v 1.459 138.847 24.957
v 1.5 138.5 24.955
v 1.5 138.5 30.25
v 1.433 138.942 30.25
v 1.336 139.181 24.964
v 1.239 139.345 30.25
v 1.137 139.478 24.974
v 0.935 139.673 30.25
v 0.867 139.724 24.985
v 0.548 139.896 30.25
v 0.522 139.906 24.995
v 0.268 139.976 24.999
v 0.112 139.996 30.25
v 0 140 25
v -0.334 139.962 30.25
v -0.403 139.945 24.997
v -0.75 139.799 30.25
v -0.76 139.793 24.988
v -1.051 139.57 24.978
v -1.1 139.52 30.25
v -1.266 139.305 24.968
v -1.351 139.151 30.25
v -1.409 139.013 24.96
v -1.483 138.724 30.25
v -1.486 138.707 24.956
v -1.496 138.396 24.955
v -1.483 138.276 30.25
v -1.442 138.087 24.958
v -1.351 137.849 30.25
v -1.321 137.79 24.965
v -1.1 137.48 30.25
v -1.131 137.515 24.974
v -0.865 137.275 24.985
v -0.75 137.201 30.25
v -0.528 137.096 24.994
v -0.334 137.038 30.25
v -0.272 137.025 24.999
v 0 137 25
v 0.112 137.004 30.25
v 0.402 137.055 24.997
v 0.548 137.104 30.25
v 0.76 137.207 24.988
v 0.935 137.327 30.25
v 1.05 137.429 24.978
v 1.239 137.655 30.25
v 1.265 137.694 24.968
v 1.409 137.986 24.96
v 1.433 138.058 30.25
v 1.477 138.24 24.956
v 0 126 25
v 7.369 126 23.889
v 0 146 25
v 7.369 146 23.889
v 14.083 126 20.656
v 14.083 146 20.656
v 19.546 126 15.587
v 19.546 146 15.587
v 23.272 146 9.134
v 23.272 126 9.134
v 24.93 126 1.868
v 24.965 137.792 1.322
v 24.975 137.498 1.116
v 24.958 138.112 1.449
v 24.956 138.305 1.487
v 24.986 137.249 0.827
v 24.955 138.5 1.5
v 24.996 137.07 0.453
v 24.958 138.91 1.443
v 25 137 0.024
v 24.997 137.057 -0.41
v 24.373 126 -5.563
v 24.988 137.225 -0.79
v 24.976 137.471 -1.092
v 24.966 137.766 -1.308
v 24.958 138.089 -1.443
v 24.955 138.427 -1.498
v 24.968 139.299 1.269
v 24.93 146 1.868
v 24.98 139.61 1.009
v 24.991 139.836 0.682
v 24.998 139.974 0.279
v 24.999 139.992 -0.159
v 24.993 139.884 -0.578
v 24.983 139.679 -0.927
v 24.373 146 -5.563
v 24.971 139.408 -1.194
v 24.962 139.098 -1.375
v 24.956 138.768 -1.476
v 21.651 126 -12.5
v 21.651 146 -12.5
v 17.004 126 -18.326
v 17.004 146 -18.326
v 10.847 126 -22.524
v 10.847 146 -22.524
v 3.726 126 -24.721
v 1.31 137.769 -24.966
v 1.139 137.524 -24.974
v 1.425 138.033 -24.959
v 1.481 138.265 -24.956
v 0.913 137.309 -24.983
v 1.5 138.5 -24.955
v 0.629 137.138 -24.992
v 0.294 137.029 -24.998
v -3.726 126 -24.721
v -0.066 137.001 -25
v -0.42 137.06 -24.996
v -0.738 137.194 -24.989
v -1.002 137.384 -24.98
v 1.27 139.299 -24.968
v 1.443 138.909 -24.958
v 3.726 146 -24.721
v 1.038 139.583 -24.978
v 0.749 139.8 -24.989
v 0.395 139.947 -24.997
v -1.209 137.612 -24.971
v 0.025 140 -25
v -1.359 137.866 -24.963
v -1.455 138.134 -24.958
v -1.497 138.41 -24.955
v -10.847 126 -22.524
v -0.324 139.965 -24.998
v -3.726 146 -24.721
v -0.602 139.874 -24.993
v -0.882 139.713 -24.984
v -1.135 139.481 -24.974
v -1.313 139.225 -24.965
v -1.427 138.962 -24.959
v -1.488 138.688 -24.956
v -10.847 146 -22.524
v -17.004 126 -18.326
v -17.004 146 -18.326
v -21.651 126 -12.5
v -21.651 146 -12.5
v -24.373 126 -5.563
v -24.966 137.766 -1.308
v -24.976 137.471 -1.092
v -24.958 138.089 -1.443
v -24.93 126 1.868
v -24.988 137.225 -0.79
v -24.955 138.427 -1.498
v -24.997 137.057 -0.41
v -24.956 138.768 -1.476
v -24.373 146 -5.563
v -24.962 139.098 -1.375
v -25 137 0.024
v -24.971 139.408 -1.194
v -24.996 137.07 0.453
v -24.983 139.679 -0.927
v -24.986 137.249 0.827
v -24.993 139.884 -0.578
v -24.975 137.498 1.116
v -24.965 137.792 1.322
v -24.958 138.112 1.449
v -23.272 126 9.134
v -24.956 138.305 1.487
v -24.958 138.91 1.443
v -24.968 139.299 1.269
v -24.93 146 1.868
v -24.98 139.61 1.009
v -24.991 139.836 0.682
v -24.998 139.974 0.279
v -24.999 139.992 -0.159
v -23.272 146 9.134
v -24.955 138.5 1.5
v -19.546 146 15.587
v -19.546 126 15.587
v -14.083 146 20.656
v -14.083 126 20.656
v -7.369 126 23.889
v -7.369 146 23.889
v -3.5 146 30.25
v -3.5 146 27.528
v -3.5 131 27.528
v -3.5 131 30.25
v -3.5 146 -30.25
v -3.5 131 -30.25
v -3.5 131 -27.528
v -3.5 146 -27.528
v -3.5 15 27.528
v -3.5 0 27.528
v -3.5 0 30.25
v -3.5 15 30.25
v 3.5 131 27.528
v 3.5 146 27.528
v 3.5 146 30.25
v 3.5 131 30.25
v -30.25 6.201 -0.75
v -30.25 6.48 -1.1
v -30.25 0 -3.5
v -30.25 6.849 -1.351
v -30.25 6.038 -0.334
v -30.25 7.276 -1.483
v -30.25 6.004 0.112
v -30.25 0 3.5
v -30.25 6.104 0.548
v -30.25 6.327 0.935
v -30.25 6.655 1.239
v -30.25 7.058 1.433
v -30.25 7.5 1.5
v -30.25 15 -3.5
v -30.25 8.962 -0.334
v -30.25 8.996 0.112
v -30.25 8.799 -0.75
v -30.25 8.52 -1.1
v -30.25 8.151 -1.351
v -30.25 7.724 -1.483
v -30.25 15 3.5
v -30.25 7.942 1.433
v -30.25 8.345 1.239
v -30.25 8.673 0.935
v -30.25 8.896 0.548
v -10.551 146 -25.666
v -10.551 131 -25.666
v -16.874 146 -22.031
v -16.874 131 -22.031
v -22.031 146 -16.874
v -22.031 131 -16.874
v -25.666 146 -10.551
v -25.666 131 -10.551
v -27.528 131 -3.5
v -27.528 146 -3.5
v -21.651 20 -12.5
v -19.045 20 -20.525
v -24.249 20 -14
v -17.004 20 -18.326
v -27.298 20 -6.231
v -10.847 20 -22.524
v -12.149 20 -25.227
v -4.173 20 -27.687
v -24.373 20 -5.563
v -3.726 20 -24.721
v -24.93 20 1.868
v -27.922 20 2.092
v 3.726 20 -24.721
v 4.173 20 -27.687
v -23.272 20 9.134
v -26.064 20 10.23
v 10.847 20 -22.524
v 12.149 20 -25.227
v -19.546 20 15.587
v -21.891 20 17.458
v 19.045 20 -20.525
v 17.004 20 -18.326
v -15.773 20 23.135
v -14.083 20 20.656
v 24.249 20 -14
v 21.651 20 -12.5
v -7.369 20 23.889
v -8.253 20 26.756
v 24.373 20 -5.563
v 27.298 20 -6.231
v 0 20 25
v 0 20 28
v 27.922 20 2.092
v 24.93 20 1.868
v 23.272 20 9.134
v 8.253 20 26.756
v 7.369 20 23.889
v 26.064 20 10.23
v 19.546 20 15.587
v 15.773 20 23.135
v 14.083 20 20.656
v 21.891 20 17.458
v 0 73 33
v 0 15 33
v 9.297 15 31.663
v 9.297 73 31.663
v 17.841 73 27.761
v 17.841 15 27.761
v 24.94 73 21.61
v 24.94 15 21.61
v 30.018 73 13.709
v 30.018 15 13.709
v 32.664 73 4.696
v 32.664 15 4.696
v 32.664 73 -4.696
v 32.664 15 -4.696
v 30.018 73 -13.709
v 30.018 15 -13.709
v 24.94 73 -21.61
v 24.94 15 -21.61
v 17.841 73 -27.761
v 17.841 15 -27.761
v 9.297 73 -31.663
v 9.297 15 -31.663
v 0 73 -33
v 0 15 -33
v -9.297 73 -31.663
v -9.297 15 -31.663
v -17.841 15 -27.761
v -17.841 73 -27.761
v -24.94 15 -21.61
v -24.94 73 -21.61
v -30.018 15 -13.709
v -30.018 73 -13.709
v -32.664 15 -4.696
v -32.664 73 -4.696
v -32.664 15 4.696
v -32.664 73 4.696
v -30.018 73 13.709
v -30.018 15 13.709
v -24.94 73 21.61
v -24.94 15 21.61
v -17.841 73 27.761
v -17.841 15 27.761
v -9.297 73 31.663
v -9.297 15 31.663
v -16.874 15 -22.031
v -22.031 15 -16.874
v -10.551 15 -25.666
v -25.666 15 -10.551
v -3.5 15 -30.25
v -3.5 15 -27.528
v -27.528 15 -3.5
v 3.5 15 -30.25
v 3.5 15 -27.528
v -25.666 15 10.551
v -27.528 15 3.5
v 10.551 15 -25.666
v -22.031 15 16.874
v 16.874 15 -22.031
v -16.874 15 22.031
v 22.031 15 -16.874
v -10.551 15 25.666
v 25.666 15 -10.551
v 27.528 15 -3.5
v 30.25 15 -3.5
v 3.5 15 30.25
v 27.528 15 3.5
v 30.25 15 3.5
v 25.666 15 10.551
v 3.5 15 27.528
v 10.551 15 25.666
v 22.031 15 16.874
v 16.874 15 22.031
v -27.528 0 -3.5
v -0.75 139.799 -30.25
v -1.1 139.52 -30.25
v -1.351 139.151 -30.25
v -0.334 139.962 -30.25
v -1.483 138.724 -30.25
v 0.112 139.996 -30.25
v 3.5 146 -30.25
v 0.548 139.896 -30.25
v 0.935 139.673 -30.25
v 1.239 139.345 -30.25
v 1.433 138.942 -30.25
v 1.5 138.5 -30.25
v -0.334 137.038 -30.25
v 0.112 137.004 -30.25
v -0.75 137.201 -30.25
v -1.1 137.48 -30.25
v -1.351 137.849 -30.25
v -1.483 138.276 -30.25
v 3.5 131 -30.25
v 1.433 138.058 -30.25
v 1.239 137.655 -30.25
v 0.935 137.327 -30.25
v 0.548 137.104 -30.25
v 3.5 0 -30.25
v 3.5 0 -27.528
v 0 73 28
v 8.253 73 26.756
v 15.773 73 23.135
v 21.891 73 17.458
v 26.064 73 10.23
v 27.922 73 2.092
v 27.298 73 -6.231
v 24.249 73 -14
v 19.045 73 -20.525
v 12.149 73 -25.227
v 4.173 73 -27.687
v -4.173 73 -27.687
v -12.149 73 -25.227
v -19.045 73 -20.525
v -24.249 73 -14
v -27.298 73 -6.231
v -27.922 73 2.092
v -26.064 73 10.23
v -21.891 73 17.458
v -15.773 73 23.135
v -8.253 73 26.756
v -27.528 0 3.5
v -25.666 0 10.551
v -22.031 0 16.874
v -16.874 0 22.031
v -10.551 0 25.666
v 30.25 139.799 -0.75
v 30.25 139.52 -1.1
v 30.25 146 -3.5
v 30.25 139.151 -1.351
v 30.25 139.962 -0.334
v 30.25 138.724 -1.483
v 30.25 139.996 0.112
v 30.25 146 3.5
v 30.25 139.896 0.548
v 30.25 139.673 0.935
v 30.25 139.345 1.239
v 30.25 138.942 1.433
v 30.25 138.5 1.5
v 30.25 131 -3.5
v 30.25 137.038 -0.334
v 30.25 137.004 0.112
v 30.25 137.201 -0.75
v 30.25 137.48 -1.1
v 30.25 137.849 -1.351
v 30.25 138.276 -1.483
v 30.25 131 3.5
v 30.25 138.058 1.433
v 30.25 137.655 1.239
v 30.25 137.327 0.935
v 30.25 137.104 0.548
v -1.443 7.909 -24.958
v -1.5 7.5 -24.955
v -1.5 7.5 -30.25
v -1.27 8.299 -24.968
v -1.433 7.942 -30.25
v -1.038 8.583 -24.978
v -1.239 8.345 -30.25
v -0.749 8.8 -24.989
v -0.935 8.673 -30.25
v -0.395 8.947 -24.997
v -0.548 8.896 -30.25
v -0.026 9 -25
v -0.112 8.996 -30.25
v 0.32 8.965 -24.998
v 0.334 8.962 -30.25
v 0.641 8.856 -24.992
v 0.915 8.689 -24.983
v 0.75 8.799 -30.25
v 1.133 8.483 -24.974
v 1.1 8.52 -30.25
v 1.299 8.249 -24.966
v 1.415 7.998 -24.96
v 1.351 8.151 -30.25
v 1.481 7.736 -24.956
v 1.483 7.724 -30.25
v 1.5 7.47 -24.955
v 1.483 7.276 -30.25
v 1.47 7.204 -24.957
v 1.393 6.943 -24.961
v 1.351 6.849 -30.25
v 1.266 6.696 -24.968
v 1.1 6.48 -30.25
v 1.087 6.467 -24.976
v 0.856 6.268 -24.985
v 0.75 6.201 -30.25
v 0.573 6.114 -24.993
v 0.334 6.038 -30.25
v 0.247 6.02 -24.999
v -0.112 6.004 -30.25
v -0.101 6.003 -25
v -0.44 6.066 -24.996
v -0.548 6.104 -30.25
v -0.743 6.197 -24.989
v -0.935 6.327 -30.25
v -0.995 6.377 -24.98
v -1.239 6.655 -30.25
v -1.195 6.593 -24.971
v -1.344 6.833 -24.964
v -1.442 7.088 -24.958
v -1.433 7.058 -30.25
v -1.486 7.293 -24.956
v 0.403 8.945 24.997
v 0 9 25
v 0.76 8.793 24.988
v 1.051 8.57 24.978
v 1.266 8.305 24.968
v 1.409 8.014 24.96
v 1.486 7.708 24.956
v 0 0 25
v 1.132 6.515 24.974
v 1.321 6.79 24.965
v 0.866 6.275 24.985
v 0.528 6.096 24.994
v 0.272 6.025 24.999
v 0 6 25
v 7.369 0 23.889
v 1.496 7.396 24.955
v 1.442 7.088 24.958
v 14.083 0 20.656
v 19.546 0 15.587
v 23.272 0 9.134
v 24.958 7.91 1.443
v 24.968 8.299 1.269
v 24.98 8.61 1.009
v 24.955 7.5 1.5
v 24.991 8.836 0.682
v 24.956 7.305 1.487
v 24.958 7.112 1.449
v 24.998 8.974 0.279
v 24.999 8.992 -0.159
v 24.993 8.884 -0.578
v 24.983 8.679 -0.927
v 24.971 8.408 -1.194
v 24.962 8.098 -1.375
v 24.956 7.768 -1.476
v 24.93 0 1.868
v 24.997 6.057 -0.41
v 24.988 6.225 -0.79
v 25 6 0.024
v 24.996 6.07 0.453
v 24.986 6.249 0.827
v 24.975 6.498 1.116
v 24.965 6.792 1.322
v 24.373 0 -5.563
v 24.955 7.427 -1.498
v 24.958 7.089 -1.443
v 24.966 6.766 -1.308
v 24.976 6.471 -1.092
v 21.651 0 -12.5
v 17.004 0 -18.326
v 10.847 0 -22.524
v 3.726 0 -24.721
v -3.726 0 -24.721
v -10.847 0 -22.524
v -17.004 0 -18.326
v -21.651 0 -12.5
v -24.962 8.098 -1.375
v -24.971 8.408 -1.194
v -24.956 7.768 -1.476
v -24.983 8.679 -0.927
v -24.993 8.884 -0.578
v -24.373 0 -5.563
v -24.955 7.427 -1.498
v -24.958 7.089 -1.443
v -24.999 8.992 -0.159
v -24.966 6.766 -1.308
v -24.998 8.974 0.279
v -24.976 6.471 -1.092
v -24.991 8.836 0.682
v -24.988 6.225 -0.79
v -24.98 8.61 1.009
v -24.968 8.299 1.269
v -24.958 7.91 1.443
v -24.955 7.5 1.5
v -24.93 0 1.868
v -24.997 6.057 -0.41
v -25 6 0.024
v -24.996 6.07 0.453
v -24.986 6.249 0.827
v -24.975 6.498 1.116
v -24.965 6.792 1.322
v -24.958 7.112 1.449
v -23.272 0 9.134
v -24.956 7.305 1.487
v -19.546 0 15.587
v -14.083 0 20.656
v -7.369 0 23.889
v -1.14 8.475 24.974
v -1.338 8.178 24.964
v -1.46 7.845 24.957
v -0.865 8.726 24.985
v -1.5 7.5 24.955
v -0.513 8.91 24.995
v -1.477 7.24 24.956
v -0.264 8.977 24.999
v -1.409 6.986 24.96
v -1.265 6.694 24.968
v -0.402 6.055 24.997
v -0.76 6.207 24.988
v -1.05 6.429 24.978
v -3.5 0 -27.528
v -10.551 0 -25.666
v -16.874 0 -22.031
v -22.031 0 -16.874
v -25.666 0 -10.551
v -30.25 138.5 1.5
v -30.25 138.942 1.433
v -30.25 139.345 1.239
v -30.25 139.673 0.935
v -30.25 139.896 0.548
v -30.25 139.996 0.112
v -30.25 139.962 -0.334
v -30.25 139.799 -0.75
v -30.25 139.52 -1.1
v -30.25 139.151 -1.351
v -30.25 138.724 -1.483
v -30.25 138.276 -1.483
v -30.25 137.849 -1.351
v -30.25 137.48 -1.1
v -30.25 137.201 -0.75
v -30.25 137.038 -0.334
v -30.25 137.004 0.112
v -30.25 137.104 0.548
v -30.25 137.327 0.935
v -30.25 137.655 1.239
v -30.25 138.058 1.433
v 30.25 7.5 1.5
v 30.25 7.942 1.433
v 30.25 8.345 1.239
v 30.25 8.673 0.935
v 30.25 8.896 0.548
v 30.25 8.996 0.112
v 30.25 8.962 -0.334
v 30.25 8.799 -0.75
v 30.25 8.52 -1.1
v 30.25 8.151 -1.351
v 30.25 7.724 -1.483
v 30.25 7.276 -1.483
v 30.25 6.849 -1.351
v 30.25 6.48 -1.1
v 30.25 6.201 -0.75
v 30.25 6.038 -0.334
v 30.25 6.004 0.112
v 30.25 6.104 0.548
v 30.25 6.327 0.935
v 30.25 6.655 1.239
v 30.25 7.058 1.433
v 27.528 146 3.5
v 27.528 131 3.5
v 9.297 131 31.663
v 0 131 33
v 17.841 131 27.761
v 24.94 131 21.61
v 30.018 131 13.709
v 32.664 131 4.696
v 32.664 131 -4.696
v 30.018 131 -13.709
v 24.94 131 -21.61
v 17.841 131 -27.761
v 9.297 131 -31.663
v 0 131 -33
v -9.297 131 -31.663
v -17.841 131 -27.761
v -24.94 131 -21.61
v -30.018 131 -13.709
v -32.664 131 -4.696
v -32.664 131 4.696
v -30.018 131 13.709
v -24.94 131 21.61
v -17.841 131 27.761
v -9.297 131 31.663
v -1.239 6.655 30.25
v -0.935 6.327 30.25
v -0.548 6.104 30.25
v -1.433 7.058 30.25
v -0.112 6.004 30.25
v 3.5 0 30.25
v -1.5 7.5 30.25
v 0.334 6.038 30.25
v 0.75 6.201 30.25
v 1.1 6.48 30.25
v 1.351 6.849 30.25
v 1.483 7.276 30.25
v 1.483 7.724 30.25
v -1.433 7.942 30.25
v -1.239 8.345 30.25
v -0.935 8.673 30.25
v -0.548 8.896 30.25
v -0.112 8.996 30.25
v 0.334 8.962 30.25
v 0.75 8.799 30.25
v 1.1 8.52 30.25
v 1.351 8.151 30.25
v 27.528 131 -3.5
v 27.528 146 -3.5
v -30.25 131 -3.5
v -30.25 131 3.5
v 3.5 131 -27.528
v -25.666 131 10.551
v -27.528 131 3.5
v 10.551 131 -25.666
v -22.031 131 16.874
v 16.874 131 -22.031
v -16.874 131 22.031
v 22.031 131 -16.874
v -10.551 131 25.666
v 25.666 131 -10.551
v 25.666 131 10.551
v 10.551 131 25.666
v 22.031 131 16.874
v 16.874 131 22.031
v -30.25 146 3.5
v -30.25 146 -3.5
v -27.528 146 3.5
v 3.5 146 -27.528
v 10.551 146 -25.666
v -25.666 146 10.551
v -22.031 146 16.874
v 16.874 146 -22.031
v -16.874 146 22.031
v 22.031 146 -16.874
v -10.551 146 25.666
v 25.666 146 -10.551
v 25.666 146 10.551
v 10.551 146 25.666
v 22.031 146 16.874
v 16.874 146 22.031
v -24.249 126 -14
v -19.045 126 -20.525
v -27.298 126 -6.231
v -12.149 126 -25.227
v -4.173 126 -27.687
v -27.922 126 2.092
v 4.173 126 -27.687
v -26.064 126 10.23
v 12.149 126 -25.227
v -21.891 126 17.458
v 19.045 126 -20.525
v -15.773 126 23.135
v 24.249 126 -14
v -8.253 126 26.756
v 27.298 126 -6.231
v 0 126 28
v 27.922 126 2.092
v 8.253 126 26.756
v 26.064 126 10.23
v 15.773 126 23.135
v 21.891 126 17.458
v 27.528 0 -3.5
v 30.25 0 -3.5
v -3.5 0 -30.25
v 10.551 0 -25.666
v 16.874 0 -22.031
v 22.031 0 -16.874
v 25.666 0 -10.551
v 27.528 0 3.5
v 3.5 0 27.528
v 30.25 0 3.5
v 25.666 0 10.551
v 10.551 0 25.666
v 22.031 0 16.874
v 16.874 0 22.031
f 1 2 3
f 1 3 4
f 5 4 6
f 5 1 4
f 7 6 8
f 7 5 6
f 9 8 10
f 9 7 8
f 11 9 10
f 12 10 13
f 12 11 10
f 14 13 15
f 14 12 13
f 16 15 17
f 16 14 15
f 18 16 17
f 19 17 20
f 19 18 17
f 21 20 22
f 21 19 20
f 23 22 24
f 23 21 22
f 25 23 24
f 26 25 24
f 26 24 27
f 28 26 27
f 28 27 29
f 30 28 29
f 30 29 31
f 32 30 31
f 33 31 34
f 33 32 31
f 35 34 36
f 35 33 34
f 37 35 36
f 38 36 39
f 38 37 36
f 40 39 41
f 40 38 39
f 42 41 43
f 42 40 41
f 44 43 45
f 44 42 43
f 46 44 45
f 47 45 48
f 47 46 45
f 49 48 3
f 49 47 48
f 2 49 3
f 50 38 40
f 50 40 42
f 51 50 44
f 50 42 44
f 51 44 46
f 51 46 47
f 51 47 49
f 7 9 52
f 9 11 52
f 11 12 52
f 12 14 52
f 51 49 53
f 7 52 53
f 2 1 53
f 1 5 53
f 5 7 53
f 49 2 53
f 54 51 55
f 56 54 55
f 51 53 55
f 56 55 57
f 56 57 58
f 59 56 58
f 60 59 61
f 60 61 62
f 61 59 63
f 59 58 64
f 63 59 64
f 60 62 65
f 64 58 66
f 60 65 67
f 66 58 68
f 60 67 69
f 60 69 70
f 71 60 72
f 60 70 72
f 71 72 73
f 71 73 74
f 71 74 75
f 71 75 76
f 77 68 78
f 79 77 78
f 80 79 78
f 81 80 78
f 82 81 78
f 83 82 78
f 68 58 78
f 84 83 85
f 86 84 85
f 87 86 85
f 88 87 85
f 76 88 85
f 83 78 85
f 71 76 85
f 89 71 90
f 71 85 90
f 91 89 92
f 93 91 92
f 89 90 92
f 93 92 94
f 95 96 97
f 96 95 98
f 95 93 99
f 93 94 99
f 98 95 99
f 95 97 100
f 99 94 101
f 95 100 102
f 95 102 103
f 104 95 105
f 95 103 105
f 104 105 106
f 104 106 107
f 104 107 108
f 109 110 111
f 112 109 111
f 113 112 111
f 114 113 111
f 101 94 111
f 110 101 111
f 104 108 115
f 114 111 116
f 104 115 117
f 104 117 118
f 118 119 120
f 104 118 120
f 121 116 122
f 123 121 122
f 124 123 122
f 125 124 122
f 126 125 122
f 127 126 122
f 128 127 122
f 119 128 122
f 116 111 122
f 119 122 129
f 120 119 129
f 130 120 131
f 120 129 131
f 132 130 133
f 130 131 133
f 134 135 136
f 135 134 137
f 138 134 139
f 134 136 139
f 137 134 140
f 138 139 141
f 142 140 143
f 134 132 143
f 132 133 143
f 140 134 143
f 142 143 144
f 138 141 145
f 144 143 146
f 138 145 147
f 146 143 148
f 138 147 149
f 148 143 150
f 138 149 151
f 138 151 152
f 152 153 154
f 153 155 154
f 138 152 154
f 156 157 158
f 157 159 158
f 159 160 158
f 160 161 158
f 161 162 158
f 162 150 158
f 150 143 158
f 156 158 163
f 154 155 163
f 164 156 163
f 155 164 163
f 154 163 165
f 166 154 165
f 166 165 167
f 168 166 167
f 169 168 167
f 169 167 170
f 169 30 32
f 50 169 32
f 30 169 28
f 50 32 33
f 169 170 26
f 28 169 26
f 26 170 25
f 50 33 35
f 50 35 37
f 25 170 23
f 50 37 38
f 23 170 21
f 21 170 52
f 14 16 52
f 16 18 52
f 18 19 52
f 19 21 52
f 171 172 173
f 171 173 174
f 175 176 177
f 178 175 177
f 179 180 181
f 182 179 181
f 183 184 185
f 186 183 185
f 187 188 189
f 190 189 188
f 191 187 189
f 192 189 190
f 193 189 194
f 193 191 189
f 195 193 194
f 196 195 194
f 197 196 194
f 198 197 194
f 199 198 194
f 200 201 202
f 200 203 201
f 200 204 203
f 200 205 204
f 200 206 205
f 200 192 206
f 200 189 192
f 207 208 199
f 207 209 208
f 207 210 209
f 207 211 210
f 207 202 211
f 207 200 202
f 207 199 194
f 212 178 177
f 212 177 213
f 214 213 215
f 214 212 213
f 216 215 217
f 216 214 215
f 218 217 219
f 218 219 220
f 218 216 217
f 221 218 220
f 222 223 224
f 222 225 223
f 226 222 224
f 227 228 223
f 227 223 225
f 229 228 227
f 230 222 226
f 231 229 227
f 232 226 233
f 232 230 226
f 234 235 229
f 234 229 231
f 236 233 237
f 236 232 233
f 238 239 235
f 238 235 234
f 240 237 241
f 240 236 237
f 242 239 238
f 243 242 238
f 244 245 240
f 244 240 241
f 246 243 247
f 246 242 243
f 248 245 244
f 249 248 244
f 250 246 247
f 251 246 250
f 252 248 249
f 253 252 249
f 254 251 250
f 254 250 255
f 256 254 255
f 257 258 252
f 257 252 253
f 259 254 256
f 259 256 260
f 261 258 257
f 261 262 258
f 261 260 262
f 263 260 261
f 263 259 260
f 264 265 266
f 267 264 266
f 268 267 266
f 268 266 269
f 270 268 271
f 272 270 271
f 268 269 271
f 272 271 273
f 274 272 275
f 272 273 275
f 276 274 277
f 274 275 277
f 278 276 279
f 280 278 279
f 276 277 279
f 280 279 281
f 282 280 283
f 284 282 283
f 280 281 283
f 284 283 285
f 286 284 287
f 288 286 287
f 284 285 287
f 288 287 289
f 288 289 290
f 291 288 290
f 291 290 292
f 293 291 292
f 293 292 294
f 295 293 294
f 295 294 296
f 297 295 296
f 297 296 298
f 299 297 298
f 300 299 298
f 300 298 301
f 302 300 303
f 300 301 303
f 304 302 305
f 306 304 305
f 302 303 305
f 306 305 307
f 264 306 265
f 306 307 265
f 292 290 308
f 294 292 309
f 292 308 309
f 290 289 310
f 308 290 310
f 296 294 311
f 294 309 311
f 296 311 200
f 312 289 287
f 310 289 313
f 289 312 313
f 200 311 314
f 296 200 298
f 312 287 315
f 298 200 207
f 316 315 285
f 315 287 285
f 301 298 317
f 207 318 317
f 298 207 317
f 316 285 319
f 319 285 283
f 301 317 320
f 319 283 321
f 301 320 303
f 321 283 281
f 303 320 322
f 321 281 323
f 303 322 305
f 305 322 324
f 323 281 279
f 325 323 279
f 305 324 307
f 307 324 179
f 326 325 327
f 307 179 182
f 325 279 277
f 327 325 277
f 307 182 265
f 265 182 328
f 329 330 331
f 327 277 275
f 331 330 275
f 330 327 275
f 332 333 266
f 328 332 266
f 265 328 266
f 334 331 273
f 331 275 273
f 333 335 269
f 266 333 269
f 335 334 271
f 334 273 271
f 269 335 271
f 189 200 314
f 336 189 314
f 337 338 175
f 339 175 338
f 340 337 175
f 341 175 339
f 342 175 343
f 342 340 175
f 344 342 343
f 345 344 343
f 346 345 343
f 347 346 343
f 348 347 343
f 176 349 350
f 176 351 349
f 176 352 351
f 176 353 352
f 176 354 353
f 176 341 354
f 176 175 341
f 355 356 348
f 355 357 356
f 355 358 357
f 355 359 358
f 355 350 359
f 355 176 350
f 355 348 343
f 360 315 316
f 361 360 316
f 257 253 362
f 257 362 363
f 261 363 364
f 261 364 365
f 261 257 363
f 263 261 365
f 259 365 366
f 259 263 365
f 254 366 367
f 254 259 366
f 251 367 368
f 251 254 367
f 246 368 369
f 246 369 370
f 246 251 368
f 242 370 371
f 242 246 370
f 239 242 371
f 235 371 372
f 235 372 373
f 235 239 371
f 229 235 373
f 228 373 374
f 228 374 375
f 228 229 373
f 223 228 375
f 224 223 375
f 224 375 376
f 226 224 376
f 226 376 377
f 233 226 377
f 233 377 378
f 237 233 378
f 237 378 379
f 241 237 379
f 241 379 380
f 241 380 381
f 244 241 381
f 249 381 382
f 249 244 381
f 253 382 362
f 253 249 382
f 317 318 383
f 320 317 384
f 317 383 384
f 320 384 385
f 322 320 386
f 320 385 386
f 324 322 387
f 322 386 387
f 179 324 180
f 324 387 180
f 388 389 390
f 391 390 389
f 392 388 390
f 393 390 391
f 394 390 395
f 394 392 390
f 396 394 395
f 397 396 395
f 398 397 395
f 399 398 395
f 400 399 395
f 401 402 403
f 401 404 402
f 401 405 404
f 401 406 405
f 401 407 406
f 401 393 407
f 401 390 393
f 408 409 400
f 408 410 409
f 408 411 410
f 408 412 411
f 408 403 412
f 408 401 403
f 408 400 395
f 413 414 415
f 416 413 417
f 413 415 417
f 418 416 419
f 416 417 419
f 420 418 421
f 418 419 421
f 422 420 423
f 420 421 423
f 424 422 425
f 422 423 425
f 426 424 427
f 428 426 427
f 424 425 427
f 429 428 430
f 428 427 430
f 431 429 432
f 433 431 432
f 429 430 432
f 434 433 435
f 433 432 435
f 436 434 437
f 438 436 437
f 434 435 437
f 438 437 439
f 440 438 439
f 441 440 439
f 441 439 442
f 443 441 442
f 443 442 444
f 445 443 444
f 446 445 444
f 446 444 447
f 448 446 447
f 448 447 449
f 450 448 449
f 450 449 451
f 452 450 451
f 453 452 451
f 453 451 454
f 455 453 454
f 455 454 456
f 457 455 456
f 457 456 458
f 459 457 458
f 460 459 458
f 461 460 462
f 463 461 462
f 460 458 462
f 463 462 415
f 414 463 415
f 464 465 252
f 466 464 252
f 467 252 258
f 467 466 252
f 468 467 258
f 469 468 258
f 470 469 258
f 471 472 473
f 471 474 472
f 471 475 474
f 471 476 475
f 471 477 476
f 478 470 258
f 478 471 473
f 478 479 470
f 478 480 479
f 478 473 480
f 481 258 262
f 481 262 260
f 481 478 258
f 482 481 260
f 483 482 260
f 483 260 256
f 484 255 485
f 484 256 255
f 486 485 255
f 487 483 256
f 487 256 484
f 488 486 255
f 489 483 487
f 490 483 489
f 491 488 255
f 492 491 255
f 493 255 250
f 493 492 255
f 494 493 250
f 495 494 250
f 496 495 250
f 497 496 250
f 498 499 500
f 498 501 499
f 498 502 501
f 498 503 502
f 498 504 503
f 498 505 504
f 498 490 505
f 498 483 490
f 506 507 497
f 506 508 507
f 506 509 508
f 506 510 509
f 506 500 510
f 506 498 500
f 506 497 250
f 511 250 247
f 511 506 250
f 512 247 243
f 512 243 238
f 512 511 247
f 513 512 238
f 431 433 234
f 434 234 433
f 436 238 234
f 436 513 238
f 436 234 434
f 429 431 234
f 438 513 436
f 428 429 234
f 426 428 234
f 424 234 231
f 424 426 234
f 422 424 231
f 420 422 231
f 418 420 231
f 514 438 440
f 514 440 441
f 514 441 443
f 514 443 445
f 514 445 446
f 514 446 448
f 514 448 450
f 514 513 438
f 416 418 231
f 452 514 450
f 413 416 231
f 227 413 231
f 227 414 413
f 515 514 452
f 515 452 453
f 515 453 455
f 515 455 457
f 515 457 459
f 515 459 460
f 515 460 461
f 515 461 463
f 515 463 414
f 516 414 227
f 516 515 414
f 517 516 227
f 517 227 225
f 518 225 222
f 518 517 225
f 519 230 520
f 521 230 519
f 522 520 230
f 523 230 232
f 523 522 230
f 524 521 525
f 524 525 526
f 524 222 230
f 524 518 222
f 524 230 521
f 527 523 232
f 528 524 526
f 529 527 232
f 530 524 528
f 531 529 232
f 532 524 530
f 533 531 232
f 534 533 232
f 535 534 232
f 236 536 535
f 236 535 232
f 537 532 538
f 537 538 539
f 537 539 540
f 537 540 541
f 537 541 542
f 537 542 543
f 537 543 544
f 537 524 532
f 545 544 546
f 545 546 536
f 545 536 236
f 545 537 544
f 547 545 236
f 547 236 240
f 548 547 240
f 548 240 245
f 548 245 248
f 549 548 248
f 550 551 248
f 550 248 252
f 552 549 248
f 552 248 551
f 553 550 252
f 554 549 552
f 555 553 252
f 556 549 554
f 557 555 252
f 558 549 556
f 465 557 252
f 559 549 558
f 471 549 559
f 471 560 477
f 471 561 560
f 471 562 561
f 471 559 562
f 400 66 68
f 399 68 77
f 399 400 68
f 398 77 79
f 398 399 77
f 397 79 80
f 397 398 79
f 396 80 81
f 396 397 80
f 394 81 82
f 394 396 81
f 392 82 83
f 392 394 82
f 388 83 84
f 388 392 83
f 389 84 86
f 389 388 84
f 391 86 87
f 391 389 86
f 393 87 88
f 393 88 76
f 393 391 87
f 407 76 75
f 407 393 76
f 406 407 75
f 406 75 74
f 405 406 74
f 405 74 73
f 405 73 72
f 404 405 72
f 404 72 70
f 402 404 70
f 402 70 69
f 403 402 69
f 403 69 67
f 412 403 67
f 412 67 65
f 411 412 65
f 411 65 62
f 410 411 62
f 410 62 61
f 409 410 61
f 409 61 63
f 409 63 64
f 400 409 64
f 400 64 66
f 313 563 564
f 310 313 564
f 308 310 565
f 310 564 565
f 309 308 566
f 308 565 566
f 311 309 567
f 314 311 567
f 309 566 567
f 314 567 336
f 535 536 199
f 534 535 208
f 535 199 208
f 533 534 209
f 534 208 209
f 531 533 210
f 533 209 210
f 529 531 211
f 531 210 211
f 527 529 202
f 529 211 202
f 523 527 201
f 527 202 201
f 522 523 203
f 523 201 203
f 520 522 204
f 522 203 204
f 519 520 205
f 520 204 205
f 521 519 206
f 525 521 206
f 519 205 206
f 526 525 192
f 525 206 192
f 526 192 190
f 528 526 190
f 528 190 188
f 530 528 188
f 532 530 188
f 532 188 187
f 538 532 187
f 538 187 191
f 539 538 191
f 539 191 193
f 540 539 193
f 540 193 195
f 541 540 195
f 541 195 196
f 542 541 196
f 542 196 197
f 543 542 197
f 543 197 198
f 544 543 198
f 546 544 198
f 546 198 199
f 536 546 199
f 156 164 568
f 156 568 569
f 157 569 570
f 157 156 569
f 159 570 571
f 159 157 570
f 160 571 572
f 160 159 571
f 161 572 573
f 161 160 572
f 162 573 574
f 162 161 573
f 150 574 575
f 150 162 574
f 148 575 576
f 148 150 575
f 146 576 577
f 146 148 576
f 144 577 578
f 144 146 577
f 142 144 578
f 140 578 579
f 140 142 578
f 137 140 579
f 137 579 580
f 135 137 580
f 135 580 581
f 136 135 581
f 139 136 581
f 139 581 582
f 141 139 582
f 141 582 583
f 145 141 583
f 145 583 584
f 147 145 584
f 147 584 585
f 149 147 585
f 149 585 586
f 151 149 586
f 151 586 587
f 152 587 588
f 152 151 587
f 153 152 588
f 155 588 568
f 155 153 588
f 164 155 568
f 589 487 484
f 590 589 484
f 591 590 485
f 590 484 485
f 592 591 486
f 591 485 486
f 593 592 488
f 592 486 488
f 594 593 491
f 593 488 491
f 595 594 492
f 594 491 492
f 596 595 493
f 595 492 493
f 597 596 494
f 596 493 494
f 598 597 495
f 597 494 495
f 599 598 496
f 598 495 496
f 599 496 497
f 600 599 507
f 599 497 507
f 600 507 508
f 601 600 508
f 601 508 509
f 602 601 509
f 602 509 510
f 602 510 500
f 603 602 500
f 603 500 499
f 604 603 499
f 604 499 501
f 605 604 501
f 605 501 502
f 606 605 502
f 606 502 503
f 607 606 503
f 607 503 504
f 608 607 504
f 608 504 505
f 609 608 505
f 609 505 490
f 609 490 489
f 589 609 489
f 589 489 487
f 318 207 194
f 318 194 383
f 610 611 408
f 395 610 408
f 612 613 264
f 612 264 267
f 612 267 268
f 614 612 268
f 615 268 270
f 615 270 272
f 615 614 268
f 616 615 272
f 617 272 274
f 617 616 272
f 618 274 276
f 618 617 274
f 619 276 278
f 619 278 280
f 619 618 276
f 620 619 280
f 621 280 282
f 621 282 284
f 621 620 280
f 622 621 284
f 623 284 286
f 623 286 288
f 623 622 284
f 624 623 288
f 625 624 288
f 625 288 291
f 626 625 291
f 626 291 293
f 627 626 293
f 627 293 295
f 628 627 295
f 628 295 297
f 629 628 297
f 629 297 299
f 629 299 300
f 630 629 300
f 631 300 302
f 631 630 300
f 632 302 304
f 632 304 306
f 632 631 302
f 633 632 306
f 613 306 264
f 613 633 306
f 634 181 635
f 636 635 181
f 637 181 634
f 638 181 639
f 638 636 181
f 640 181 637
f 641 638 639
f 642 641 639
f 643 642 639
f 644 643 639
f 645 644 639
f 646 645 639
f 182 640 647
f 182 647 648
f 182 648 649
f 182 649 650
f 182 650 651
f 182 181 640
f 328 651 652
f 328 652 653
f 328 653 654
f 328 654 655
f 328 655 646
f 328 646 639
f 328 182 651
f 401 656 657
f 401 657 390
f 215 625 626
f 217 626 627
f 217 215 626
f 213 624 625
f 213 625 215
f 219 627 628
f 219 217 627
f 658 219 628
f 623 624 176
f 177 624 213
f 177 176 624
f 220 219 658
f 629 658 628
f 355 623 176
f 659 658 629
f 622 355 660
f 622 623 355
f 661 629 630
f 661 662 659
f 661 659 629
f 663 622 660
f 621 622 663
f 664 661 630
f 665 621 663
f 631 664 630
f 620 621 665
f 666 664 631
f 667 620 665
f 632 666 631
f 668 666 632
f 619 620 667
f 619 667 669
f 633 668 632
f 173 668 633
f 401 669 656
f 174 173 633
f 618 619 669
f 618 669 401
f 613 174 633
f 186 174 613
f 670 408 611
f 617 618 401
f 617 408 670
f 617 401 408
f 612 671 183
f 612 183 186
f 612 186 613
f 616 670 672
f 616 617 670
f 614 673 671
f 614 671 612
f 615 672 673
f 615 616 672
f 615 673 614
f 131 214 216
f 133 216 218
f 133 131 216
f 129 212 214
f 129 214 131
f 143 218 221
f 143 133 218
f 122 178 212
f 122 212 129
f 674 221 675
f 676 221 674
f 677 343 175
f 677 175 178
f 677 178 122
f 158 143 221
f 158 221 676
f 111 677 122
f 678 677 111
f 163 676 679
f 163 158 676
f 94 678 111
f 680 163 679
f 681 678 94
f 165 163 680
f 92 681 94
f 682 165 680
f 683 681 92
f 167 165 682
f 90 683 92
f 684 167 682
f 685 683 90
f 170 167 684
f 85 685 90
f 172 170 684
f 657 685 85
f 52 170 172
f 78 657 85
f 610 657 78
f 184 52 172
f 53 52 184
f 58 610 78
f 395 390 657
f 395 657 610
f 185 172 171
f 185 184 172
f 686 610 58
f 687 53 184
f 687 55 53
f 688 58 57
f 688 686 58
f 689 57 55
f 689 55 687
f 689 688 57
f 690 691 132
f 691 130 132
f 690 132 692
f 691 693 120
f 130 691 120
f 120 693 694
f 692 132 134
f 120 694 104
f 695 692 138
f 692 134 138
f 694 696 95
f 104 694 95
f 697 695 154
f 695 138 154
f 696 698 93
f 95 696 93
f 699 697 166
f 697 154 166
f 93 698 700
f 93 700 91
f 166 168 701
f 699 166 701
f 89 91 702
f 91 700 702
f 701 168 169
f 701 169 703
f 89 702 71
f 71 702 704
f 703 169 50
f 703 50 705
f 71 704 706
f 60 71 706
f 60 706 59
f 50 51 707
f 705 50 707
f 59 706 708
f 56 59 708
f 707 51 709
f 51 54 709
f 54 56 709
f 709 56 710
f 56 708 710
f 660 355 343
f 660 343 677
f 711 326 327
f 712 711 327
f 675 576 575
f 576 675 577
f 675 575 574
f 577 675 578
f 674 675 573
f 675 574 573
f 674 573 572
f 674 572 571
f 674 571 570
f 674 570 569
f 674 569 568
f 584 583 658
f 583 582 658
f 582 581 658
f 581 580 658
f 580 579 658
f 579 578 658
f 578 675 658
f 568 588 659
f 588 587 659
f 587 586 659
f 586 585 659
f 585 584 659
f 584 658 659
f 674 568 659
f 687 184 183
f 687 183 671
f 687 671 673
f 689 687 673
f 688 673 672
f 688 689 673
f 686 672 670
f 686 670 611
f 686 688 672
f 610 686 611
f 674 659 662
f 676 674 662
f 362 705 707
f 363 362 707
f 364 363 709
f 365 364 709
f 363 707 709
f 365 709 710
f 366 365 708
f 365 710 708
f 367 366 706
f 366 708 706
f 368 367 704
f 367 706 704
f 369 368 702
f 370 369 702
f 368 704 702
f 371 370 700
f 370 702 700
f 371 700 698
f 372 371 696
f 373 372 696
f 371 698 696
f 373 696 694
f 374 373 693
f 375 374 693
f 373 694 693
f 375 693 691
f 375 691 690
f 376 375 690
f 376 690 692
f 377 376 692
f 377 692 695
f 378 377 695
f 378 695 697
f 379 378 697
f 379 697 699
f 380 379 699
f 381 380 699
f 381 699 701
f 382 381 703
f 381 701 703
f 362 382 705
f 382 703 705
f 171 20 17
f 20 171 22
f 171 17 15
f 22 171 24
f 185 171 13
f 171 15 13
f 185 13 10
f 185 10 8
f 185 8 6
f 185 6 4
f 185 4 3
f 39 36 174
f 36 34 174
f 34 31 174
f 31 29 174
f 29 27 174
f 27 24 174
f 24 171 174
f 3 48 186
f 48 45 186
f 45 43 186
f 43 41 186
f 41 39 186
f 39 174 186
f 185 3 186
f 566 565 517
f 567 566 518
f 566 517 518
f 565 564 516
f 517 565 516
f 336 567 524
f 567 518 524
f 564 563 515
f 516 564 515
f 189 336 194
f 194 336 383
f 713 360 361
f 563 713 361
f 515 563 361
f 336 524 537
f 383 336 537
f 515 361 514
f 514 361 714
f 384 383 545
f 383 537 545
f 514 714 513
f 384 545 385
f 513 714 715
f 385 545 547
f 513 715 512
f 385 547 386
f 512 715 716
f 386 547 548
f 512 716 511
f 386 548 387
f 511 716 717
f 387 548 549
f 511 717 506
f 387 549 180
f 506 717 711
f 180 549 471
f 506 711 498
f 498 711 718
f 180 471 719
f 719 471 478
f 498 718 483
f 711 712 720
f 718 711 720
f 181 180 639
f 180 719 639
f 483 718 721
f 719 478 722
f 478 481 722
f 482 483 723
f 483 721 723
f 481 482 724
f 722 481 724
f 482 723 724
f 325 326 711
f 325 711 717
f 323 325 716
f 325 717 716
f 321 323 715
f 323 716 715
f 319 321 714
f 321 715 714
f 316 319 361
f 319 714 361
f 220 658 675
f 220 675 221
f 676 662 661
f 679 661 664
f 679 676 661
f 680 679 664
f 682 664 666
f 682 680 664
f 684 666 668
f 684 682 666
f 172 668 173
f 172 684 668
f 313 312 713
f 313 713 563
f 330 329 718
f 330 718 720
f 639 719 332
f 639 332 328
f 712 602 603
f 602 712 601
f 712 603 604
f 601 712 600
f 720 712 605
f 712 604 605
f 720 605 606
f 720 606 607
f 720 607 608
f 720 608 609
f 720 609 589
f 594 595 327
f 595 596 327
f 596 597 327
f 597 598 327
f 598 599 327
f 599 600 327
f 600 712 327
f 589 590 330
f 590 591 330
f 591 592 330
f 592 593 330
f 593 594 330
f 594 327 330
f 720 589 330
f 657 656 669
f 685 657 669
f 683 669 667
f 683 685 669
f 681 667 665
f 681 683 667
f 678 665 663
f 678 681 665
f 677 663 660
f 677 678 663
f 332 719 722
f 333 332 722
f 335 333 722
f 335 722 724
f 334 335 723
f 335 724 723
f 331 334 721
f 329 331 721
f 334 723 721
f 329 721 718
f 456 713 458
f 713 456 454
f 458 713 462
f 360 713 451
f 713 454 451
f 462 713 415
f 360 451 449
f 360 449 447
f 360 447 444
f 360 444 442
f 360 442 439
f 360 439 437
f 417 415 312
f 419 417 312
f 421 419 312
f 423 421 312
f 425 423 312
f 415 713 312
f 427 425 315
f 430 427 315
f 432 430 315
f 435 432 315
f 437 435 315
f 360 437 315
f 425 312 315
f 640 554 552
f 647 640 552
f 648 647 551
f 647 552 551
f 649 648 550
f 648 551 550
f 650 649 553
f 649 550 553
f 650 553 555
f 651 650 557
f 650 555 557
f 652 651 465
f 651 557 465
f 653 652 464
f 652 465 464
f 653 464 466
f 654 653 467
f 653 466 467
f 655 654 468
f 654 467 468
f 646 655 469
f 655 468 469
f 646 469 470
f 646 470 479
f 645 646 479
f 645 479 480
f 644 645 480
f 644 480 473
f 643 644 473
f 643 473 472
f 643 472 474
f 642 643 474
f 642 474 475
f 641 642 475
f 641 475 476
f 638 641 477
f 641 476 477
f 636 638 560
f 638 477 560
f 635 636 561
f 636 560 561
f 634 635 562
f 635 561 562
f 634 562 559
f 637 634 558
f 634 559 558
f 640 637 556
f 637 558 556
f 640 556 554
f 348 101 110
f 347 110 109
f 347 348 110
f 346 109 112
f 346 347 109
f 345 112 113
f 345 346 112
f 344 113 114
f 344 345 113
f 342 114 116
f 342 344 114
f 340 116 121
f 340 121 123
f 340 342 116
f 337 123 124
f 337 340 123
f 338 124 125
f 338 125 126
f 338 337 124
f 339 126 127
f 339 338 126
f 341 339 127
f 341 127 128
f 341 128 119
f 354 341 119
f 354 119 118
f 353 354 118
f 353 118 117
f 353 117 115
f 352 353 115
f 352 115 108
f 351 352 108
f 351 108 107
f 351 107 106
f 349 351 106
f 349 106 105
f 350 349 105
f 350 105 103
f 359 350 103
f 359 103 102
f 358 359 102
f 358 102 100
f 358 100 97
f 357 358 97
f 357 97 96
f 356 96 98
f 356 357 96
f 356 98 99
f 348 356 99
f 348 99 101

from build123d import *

# Parameters (mm, degrees)
CROQUIS3_R                 = 27.75
CROQUIS3_R_2               = 25
SALIENTE_EXTRUIR1_DEPTH    = 15
CROQUIS4_R                 = 33
CROQUIS4_R_2               = 25
SALIENTE_EXTRUIR2_DEPTH    = 5
CROQUIS5_R                 = 33
CROQUIS5_R_2               = 28
SALIENTE_EXTRUIR3_DEPTH    = 53
CROQUIS6_W                 = 5
CROQUIS6_H                 = 7
CROQUIS6_W_2               = 7
CROQUIS6_H_2               = 5
SALIENTE_EXTRUIR4_DEPTH    = 15
CROQUIS7_R                 = 1.5
CORTAR_EXTRUIR1_DEPTH      = 163.497884602
CROQUIS8_R                 = 1.5
CORTAR_EXTRUIR2_DEPTH      = 163.497884602
CORTAR_EXTRUIR3_DEPTH      = 163.497884602
CORTAR_EXTRUIR3_DEPTH_BACK = 163.497884602
CROQUIS9_R                 = 1.5
CORTAR_EXTRUIR4_DEPTH      = 163.497884691
CORTAR_EXTRUIR4_DEPTH_BACK = 163.497884691
CROQUIS10_R                = 1.5


with BuildPart() as part:
    # Croquis3 → Saliente-Extruir1 (new body)
    with BuildSketch(Plane(origin=(0, 0, 0), x_dir=(1, 0, 0), z_dir=(0, 1, 0))):
        with Locations(Location((0, 0, 0), (0, 0, 270))):
            Circle(CROQUIS3_R)
        with Locations(Location((0, 0, 0), (0, 0, 270))):
            Circle(CROQUIS3_R_2, mode=Mode.SUBTRACT)
    extrude(amount=SALIENTE_EXTRUIR1_DEPTH)

    # Croquis4 → Saliente-Extruir2 (add)
    with BuildSketch(Plane(origin=(0, 15, 0), x_dir=(1, 0, 0), z_dir=(0, 1, 0))):
        with Locations(Location((0, 0, 0), (0, 0, 270))):
            Circle(CROQUIS4_R)
        with Locations(Location((0, 0, 0), (0, 0, 270))):
            Circle(CROQUIS4_R_2, mode=Mode.SUBTRACT)
    extrude(amount=SALIENTE_EXTRUIR2_DEPTH)

    # Croquis5 → Saliente-Extruir3 (add)
    with BuildSketch(Plane(origin=(0, 20, 0), x_dir=(1, 0, 0), z_dir=(0, 1, 0))):
        with Locations(Location((0, 0, 0), (0, 0, 270))):
            Circle(CROQUIS5_R)
        with Locations(Location((0, 0, 0), (0, 0, 270))):
            Circle(CROQUIS5_R_2, mode=Mode.SUBTRACT)
    extrude(amount=SALIENTE_EXTRUIR3_DEPTH)

    # Croquis6 → Saliente-Extruir4 (add)
    with BuildSketch(Plane.XZ.offset(-15)):
        with Locations((27.75, 0)):
            Rectangle(CROQUIS6_W, CROQUIS6_H)
        with Locations((0, 27.75)):
            Rectangle(CROQUIS6_W_2, CROQUIS6_H_2)
        with Locations((0, -27.75)):
            Rectangle(CROQUIS6_W_2, CROQUIS6_H_2)
        with Locations((-27.75, 0)):
            Rectangle(CROQUIS6_W, CROQUIS6_H)
    extrude(amount=SALIENTE_EXTRUIR4_DEPTH)

    # Simetría2: part across plane


with BuildPart() as part_1:
    add(part.part)
    add(part.part.mirror(Plane.ZX.offset(73)))

    # Croquis7 → Cortar-Extruir1 (cut, through all)
    with BuildSketch(Plane.ZY.offset(30.25)):
        with Locations((0, 7.5)):
            Circle(CROQUIS7_R)
    extrude(amount=-CORTAR_EXTRUIR1_DEPTH, mode=Mode.SUBTRACT)

    # Croquis8 → Cortar-Extruir2 (cut, through all)
    with BuildSketch(Plane(origin=(0, 0, -30.25), x_dir=(-1, 0, 0), z_dir=(0, 0, -1))):
        with Locations((0, 7.5)):
            Circle(CROQUIS8_R)
    extrude(amount=-CORTAR_EXTRUIR2_DEPTH, mode=Mode.SUBTRACT)

    # Croquis9 → Cortar-Extruir3 (cut, two sides: drawn at the far end of the back side and taken through both)
    with BuildSketch(Plane.ZY.offset(30.25).offset(-CORTAR_EXTRUIR3_DEPTH_BACK)):
        with Locations((0, 138.5)):
            Circle(CROQUIS9_R)
    extrude(amount=CORTAR_EXTRUIR3_DEPTH + CORTAR_EXTRUIR3_DEPTH_BACK, mode=Mode.SUBTRACT)

    # Croquis10 → Cortar-Extruir4 (cut, two sides: drawn at the far end of the back side and taken through both)
    with BuildSketch(Plane.XY.offset(30.25).offset(-CORTAR_EXTRUIR4_DEPTH_BACK)):
        with Locations((0, 138.5)):
            Circle(CROQUIS10_R)
    extrude(amount=CORTAR_EXTRUIR4_DEPTH + CORTAR_EXTRUIR4_DEPTH_BACK, mode=Mode.SUBTRACT)


solid = part_1.part
